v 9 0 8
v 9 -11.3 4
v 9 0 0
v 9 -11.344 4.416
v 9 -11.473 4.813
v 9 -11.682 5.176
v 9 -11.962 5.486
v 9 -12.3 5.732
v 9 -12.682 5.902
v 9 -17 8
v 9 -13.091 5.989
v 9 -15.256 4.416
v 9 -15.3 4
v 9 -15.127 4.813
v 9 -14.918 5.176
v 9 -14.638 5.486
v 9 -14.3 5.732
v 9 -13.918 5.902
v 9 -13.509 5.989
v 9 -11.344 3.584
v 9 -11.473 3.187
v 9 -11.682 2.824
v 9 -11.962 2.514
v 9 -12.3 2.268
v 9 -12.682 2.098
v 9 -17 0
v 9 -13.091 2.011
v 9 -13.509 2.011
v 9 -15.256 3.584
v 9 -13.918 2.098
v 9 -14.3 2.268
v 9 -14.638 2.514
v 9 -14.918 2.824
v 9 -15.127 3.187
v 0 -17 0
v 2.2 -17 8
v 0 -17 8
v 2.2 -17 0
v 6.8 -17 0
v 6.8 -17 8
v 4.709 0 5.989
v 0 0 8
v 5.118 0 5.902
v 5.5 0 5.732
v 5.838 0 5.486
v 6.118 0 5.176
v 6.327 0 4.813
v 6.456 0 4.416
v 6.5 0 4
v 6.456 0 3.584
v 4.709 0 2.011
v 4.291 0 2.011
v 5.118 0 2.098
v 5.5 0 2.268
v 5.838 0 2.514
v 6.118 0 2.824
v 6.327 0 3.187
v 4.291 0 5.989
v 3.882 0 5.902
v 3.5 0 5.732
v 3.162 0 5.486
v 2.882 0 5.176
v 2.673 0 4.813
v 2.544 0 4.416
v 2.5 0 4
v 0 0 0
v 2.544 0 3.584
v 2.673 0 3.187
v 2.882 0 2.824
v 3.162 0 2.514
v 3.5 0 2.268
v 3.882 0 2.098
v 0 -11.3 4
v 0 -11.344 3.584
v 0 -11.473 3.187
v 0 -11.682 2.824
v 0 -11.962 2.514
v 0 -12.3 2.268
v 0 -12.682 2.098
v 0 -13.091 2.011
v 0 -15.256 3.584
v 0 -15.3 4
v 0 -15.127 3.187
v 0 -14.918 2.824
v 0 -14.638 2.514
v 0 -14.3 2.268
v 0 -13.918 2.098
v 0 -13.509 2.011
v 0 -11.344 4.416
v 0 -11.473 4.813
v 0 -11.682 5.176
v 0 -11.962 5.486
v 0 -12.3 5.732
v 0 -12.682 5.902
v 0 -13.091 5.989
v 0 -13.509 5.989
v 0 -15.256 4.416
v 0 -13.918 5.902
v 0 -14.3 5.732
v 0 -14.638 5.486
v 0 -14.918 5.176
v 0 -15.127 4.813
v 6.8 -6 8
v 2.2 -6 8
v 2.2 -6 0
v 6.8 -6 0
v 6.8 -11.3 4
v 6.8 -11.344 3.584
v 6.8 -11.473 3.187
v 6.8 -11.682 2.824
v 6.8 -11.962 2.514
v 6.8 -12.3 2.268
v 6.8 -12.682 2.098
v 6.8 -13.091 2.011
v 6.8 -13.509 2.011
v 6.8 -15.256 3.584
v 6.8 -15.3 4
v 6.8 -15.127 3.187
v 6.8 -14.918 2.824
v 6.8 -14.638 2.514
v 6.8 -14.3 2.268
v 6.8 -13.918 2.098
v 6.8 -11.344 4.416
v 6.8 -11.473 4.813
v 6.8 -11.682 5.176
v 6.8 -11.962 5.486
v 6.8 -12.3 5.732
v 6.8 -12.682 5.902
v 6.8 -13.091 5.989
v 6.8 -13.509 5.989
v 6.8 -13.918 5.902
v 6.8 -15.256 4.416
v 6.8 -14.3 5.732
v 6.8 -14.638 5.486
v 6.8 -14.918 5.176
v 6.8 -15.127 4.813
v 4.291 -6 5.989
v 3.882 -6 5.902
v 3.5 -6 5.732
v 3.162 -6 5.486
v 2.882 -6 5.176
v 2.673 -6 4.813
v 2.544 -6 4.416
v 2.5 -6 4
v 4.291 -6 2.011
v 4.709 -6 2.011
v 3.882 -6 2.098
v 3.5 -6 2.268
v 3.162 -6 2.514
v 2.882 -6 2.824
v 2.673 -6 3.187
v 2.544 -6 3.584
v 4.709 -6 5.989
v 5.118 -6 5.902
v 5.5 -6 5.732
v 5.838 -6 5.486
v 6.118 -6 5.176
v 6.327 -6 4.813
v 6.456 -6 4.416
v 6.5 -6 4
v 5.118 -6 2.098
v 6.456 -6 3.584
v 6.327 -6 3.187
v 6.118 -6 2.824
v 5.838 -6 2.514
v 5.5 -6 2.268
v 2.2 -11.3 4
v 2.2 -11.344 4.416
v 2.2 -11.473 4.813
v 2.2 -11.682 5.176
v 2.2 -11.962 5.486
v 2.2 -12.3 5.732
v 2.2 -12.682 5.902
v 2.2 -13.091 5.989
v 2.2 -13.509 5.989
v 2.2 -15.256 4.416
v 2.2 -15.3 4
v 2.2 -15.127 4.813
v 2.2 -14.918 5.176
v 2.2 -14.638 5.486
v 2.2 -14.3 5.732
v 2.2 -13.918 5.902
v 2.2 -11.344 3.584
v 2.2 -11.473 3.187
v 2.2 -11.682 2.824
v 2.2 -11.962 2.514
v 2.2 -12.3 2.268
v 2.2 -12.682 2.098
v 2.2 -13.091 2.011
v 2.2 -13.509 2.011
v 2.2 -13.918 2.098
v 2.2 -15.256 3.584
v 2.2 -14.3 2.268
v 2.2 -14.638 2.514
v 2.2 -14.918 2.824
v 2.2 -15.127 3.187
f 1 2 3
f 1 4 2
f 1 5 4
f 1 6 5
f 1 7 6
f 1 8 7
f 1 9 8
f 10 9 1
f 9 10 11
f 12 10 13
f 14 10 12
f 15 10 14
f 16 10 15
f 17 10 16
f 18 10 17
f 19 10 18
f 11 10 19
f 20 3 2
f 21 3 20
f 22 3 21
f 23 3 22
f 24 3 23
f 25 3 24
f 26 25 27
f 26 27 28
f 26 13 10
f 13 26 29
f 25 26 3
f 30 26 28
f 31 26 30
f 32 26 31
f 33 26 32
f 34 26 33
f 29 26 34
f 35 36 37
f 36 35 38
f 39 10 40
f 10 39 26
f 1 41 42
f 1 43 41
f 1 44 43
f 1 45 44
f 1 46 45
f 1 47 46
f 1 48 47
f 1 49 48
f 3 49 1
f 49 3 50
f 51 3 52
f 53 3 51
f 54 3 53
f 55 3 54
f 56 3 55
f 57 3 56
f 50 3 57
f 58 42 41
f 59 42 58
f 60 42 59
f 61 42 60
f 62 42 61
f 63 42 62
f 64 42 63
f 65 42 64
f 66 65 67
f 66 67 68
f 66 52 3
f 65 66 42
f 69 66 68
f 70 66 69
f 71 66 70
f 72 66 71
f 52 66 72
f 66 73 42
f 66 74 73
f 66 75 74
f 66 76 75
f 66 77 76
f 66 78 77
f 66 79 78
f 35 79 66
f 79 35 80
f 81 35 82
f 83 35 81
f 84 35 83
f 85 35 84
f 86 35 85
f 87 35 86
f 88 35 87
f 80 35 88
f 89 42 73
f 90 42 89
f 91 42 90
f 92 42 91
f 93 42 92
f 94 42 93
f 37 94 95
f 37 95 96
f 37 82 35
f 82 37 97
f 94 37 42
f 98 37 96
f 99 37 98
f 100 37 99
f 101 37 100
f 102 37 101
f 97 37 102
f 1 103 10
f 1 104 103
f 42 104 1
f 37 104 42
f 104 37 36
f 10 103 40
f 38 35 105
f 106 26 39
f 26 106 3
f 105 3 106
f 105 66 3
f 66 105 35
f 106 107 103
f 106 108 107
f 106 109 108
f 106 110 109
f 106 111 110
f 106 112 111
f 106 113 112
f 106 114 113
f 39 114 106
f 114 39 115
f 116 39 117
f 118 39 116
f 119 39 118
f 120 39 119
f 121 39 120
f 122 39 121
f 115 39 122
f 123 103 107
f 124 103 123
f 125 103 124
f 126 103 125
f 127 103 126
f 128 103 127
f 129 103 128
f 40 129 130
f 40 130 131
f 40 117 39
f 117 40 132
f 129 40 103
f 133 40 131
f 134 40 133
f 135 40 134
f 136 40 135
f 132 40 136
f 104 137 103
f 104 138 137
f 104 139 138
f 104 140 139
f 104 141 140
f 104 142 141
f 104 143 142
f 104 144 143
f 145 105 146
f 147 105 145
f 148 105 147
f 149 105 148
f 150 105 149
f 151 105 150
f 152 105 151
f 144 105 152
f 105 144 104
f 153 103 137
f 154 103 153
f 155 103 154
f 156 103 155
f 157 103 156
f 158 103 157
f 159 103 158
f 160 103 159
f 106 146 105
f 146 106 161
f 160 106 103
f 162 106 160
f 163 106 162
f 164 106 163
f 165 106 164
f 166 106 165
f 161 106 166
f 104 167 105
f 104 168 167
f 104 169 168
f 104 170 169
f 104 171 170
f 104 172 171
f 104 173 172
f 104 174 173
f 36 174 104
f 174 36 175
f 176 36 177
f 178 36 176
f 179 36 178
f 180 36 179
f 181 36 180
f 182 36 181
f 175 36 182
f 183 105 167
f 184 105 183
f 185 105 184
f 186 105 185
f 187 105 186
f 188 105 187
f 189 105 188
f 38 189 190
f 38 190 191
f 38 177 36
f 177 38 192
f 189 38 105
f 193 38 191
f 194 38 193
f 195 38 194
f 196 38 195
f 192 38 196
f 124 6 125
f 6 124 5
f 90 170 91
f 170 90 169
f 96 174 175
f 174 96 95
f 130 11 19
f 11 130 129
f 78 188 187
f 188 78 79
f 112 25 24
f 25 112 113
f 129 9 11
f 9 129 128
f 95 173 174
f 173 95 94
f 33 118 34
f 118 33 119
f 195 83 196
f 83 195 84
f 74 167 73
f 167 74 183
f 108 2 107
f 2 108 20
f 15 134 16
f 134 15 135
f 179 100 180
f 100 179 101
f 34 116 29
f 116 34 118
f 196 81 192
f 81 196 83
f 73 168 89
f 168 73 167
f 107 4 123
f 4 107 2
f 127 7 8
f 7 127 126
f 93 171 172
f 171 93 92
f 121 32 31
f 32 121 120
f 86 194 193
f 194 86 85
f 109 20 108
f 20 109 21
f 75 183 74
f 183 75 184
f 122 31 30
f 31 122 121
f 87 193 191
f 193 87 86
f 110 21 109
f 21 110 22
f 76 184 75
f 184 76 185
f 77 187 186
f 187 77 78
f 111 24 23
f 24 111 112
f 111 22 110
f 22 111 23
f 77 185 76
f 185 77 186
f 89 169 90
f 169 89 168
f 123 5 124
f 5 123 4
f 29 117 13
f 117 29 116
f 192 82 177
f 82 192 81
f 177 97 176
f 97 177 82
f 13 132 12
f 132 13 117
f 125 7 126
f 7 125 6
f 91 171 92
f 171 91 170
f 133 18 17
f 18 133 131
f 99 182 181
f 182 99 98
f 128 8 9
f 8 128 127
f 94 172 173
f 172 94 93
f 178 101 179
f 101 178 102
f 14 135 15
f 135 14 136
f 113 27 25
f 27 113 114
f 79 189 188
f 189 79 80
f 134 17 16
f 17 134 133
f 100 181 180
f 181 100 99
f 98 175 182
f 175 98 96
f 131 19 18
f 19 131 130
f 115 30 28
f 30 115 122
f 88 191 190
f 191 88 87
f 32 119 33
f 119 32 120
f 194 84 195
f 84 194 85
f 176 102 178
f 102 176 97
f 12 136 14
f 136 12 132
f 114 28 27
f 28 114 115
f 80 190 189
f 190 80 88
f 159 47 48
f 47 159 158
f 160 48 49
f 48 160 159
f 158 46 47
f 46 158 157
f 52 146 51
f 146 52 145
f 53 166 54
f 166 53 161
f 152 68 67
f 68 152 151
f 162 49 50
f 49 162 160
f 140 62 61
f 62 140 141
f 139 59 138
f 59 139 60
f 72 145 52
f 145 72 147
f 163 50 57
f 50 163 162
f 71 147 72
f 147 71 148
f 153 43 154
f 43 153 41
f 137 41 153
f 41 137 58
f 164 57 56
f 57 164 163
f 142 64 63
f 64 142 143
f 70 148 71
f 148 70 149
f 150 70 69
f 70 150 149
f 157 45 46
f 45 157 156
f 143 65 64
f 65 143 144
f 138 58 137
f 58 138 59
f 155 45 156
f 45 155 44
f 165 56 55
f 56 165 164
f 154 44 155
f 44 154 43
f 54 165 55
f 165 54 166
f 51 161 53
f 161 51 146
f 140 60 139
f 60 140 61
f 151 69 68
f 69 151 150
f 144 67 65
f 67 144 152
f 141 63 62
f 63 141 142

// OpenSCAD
// holder for roller

r_in = 4.0 / 2;
r_1 = 12.0 / 2;

x_1 = 9.0;
x_c = x_1 / 2;
x_r = 4.6;
x_d = ( x_1 - x_r ) / 2;
y_1 = 8.0;
y_c = y_1 / 2;
z_1 = 6.0;
z_2 = r_1 + 5.0;
z_a = z_1 + z_2;

$fn=30;

module roller_holder1() {
  difference() {
    cube( [x_1,y_1,z_a] );
    translate([x_d,0,z_1]) cube( [x_r,y_1,z_2] );
    translate([0,y_c,z_1+r_1+1.3]) rotate([0,90,0]) cylinder( r=r_in, h=x_1 );
    translate([x_c,y_c,0]) cylinder( r=r_in, h=x_1 );
 }
}

// roller_holder1();
rotate([90,0,0]) roller_holder1();
